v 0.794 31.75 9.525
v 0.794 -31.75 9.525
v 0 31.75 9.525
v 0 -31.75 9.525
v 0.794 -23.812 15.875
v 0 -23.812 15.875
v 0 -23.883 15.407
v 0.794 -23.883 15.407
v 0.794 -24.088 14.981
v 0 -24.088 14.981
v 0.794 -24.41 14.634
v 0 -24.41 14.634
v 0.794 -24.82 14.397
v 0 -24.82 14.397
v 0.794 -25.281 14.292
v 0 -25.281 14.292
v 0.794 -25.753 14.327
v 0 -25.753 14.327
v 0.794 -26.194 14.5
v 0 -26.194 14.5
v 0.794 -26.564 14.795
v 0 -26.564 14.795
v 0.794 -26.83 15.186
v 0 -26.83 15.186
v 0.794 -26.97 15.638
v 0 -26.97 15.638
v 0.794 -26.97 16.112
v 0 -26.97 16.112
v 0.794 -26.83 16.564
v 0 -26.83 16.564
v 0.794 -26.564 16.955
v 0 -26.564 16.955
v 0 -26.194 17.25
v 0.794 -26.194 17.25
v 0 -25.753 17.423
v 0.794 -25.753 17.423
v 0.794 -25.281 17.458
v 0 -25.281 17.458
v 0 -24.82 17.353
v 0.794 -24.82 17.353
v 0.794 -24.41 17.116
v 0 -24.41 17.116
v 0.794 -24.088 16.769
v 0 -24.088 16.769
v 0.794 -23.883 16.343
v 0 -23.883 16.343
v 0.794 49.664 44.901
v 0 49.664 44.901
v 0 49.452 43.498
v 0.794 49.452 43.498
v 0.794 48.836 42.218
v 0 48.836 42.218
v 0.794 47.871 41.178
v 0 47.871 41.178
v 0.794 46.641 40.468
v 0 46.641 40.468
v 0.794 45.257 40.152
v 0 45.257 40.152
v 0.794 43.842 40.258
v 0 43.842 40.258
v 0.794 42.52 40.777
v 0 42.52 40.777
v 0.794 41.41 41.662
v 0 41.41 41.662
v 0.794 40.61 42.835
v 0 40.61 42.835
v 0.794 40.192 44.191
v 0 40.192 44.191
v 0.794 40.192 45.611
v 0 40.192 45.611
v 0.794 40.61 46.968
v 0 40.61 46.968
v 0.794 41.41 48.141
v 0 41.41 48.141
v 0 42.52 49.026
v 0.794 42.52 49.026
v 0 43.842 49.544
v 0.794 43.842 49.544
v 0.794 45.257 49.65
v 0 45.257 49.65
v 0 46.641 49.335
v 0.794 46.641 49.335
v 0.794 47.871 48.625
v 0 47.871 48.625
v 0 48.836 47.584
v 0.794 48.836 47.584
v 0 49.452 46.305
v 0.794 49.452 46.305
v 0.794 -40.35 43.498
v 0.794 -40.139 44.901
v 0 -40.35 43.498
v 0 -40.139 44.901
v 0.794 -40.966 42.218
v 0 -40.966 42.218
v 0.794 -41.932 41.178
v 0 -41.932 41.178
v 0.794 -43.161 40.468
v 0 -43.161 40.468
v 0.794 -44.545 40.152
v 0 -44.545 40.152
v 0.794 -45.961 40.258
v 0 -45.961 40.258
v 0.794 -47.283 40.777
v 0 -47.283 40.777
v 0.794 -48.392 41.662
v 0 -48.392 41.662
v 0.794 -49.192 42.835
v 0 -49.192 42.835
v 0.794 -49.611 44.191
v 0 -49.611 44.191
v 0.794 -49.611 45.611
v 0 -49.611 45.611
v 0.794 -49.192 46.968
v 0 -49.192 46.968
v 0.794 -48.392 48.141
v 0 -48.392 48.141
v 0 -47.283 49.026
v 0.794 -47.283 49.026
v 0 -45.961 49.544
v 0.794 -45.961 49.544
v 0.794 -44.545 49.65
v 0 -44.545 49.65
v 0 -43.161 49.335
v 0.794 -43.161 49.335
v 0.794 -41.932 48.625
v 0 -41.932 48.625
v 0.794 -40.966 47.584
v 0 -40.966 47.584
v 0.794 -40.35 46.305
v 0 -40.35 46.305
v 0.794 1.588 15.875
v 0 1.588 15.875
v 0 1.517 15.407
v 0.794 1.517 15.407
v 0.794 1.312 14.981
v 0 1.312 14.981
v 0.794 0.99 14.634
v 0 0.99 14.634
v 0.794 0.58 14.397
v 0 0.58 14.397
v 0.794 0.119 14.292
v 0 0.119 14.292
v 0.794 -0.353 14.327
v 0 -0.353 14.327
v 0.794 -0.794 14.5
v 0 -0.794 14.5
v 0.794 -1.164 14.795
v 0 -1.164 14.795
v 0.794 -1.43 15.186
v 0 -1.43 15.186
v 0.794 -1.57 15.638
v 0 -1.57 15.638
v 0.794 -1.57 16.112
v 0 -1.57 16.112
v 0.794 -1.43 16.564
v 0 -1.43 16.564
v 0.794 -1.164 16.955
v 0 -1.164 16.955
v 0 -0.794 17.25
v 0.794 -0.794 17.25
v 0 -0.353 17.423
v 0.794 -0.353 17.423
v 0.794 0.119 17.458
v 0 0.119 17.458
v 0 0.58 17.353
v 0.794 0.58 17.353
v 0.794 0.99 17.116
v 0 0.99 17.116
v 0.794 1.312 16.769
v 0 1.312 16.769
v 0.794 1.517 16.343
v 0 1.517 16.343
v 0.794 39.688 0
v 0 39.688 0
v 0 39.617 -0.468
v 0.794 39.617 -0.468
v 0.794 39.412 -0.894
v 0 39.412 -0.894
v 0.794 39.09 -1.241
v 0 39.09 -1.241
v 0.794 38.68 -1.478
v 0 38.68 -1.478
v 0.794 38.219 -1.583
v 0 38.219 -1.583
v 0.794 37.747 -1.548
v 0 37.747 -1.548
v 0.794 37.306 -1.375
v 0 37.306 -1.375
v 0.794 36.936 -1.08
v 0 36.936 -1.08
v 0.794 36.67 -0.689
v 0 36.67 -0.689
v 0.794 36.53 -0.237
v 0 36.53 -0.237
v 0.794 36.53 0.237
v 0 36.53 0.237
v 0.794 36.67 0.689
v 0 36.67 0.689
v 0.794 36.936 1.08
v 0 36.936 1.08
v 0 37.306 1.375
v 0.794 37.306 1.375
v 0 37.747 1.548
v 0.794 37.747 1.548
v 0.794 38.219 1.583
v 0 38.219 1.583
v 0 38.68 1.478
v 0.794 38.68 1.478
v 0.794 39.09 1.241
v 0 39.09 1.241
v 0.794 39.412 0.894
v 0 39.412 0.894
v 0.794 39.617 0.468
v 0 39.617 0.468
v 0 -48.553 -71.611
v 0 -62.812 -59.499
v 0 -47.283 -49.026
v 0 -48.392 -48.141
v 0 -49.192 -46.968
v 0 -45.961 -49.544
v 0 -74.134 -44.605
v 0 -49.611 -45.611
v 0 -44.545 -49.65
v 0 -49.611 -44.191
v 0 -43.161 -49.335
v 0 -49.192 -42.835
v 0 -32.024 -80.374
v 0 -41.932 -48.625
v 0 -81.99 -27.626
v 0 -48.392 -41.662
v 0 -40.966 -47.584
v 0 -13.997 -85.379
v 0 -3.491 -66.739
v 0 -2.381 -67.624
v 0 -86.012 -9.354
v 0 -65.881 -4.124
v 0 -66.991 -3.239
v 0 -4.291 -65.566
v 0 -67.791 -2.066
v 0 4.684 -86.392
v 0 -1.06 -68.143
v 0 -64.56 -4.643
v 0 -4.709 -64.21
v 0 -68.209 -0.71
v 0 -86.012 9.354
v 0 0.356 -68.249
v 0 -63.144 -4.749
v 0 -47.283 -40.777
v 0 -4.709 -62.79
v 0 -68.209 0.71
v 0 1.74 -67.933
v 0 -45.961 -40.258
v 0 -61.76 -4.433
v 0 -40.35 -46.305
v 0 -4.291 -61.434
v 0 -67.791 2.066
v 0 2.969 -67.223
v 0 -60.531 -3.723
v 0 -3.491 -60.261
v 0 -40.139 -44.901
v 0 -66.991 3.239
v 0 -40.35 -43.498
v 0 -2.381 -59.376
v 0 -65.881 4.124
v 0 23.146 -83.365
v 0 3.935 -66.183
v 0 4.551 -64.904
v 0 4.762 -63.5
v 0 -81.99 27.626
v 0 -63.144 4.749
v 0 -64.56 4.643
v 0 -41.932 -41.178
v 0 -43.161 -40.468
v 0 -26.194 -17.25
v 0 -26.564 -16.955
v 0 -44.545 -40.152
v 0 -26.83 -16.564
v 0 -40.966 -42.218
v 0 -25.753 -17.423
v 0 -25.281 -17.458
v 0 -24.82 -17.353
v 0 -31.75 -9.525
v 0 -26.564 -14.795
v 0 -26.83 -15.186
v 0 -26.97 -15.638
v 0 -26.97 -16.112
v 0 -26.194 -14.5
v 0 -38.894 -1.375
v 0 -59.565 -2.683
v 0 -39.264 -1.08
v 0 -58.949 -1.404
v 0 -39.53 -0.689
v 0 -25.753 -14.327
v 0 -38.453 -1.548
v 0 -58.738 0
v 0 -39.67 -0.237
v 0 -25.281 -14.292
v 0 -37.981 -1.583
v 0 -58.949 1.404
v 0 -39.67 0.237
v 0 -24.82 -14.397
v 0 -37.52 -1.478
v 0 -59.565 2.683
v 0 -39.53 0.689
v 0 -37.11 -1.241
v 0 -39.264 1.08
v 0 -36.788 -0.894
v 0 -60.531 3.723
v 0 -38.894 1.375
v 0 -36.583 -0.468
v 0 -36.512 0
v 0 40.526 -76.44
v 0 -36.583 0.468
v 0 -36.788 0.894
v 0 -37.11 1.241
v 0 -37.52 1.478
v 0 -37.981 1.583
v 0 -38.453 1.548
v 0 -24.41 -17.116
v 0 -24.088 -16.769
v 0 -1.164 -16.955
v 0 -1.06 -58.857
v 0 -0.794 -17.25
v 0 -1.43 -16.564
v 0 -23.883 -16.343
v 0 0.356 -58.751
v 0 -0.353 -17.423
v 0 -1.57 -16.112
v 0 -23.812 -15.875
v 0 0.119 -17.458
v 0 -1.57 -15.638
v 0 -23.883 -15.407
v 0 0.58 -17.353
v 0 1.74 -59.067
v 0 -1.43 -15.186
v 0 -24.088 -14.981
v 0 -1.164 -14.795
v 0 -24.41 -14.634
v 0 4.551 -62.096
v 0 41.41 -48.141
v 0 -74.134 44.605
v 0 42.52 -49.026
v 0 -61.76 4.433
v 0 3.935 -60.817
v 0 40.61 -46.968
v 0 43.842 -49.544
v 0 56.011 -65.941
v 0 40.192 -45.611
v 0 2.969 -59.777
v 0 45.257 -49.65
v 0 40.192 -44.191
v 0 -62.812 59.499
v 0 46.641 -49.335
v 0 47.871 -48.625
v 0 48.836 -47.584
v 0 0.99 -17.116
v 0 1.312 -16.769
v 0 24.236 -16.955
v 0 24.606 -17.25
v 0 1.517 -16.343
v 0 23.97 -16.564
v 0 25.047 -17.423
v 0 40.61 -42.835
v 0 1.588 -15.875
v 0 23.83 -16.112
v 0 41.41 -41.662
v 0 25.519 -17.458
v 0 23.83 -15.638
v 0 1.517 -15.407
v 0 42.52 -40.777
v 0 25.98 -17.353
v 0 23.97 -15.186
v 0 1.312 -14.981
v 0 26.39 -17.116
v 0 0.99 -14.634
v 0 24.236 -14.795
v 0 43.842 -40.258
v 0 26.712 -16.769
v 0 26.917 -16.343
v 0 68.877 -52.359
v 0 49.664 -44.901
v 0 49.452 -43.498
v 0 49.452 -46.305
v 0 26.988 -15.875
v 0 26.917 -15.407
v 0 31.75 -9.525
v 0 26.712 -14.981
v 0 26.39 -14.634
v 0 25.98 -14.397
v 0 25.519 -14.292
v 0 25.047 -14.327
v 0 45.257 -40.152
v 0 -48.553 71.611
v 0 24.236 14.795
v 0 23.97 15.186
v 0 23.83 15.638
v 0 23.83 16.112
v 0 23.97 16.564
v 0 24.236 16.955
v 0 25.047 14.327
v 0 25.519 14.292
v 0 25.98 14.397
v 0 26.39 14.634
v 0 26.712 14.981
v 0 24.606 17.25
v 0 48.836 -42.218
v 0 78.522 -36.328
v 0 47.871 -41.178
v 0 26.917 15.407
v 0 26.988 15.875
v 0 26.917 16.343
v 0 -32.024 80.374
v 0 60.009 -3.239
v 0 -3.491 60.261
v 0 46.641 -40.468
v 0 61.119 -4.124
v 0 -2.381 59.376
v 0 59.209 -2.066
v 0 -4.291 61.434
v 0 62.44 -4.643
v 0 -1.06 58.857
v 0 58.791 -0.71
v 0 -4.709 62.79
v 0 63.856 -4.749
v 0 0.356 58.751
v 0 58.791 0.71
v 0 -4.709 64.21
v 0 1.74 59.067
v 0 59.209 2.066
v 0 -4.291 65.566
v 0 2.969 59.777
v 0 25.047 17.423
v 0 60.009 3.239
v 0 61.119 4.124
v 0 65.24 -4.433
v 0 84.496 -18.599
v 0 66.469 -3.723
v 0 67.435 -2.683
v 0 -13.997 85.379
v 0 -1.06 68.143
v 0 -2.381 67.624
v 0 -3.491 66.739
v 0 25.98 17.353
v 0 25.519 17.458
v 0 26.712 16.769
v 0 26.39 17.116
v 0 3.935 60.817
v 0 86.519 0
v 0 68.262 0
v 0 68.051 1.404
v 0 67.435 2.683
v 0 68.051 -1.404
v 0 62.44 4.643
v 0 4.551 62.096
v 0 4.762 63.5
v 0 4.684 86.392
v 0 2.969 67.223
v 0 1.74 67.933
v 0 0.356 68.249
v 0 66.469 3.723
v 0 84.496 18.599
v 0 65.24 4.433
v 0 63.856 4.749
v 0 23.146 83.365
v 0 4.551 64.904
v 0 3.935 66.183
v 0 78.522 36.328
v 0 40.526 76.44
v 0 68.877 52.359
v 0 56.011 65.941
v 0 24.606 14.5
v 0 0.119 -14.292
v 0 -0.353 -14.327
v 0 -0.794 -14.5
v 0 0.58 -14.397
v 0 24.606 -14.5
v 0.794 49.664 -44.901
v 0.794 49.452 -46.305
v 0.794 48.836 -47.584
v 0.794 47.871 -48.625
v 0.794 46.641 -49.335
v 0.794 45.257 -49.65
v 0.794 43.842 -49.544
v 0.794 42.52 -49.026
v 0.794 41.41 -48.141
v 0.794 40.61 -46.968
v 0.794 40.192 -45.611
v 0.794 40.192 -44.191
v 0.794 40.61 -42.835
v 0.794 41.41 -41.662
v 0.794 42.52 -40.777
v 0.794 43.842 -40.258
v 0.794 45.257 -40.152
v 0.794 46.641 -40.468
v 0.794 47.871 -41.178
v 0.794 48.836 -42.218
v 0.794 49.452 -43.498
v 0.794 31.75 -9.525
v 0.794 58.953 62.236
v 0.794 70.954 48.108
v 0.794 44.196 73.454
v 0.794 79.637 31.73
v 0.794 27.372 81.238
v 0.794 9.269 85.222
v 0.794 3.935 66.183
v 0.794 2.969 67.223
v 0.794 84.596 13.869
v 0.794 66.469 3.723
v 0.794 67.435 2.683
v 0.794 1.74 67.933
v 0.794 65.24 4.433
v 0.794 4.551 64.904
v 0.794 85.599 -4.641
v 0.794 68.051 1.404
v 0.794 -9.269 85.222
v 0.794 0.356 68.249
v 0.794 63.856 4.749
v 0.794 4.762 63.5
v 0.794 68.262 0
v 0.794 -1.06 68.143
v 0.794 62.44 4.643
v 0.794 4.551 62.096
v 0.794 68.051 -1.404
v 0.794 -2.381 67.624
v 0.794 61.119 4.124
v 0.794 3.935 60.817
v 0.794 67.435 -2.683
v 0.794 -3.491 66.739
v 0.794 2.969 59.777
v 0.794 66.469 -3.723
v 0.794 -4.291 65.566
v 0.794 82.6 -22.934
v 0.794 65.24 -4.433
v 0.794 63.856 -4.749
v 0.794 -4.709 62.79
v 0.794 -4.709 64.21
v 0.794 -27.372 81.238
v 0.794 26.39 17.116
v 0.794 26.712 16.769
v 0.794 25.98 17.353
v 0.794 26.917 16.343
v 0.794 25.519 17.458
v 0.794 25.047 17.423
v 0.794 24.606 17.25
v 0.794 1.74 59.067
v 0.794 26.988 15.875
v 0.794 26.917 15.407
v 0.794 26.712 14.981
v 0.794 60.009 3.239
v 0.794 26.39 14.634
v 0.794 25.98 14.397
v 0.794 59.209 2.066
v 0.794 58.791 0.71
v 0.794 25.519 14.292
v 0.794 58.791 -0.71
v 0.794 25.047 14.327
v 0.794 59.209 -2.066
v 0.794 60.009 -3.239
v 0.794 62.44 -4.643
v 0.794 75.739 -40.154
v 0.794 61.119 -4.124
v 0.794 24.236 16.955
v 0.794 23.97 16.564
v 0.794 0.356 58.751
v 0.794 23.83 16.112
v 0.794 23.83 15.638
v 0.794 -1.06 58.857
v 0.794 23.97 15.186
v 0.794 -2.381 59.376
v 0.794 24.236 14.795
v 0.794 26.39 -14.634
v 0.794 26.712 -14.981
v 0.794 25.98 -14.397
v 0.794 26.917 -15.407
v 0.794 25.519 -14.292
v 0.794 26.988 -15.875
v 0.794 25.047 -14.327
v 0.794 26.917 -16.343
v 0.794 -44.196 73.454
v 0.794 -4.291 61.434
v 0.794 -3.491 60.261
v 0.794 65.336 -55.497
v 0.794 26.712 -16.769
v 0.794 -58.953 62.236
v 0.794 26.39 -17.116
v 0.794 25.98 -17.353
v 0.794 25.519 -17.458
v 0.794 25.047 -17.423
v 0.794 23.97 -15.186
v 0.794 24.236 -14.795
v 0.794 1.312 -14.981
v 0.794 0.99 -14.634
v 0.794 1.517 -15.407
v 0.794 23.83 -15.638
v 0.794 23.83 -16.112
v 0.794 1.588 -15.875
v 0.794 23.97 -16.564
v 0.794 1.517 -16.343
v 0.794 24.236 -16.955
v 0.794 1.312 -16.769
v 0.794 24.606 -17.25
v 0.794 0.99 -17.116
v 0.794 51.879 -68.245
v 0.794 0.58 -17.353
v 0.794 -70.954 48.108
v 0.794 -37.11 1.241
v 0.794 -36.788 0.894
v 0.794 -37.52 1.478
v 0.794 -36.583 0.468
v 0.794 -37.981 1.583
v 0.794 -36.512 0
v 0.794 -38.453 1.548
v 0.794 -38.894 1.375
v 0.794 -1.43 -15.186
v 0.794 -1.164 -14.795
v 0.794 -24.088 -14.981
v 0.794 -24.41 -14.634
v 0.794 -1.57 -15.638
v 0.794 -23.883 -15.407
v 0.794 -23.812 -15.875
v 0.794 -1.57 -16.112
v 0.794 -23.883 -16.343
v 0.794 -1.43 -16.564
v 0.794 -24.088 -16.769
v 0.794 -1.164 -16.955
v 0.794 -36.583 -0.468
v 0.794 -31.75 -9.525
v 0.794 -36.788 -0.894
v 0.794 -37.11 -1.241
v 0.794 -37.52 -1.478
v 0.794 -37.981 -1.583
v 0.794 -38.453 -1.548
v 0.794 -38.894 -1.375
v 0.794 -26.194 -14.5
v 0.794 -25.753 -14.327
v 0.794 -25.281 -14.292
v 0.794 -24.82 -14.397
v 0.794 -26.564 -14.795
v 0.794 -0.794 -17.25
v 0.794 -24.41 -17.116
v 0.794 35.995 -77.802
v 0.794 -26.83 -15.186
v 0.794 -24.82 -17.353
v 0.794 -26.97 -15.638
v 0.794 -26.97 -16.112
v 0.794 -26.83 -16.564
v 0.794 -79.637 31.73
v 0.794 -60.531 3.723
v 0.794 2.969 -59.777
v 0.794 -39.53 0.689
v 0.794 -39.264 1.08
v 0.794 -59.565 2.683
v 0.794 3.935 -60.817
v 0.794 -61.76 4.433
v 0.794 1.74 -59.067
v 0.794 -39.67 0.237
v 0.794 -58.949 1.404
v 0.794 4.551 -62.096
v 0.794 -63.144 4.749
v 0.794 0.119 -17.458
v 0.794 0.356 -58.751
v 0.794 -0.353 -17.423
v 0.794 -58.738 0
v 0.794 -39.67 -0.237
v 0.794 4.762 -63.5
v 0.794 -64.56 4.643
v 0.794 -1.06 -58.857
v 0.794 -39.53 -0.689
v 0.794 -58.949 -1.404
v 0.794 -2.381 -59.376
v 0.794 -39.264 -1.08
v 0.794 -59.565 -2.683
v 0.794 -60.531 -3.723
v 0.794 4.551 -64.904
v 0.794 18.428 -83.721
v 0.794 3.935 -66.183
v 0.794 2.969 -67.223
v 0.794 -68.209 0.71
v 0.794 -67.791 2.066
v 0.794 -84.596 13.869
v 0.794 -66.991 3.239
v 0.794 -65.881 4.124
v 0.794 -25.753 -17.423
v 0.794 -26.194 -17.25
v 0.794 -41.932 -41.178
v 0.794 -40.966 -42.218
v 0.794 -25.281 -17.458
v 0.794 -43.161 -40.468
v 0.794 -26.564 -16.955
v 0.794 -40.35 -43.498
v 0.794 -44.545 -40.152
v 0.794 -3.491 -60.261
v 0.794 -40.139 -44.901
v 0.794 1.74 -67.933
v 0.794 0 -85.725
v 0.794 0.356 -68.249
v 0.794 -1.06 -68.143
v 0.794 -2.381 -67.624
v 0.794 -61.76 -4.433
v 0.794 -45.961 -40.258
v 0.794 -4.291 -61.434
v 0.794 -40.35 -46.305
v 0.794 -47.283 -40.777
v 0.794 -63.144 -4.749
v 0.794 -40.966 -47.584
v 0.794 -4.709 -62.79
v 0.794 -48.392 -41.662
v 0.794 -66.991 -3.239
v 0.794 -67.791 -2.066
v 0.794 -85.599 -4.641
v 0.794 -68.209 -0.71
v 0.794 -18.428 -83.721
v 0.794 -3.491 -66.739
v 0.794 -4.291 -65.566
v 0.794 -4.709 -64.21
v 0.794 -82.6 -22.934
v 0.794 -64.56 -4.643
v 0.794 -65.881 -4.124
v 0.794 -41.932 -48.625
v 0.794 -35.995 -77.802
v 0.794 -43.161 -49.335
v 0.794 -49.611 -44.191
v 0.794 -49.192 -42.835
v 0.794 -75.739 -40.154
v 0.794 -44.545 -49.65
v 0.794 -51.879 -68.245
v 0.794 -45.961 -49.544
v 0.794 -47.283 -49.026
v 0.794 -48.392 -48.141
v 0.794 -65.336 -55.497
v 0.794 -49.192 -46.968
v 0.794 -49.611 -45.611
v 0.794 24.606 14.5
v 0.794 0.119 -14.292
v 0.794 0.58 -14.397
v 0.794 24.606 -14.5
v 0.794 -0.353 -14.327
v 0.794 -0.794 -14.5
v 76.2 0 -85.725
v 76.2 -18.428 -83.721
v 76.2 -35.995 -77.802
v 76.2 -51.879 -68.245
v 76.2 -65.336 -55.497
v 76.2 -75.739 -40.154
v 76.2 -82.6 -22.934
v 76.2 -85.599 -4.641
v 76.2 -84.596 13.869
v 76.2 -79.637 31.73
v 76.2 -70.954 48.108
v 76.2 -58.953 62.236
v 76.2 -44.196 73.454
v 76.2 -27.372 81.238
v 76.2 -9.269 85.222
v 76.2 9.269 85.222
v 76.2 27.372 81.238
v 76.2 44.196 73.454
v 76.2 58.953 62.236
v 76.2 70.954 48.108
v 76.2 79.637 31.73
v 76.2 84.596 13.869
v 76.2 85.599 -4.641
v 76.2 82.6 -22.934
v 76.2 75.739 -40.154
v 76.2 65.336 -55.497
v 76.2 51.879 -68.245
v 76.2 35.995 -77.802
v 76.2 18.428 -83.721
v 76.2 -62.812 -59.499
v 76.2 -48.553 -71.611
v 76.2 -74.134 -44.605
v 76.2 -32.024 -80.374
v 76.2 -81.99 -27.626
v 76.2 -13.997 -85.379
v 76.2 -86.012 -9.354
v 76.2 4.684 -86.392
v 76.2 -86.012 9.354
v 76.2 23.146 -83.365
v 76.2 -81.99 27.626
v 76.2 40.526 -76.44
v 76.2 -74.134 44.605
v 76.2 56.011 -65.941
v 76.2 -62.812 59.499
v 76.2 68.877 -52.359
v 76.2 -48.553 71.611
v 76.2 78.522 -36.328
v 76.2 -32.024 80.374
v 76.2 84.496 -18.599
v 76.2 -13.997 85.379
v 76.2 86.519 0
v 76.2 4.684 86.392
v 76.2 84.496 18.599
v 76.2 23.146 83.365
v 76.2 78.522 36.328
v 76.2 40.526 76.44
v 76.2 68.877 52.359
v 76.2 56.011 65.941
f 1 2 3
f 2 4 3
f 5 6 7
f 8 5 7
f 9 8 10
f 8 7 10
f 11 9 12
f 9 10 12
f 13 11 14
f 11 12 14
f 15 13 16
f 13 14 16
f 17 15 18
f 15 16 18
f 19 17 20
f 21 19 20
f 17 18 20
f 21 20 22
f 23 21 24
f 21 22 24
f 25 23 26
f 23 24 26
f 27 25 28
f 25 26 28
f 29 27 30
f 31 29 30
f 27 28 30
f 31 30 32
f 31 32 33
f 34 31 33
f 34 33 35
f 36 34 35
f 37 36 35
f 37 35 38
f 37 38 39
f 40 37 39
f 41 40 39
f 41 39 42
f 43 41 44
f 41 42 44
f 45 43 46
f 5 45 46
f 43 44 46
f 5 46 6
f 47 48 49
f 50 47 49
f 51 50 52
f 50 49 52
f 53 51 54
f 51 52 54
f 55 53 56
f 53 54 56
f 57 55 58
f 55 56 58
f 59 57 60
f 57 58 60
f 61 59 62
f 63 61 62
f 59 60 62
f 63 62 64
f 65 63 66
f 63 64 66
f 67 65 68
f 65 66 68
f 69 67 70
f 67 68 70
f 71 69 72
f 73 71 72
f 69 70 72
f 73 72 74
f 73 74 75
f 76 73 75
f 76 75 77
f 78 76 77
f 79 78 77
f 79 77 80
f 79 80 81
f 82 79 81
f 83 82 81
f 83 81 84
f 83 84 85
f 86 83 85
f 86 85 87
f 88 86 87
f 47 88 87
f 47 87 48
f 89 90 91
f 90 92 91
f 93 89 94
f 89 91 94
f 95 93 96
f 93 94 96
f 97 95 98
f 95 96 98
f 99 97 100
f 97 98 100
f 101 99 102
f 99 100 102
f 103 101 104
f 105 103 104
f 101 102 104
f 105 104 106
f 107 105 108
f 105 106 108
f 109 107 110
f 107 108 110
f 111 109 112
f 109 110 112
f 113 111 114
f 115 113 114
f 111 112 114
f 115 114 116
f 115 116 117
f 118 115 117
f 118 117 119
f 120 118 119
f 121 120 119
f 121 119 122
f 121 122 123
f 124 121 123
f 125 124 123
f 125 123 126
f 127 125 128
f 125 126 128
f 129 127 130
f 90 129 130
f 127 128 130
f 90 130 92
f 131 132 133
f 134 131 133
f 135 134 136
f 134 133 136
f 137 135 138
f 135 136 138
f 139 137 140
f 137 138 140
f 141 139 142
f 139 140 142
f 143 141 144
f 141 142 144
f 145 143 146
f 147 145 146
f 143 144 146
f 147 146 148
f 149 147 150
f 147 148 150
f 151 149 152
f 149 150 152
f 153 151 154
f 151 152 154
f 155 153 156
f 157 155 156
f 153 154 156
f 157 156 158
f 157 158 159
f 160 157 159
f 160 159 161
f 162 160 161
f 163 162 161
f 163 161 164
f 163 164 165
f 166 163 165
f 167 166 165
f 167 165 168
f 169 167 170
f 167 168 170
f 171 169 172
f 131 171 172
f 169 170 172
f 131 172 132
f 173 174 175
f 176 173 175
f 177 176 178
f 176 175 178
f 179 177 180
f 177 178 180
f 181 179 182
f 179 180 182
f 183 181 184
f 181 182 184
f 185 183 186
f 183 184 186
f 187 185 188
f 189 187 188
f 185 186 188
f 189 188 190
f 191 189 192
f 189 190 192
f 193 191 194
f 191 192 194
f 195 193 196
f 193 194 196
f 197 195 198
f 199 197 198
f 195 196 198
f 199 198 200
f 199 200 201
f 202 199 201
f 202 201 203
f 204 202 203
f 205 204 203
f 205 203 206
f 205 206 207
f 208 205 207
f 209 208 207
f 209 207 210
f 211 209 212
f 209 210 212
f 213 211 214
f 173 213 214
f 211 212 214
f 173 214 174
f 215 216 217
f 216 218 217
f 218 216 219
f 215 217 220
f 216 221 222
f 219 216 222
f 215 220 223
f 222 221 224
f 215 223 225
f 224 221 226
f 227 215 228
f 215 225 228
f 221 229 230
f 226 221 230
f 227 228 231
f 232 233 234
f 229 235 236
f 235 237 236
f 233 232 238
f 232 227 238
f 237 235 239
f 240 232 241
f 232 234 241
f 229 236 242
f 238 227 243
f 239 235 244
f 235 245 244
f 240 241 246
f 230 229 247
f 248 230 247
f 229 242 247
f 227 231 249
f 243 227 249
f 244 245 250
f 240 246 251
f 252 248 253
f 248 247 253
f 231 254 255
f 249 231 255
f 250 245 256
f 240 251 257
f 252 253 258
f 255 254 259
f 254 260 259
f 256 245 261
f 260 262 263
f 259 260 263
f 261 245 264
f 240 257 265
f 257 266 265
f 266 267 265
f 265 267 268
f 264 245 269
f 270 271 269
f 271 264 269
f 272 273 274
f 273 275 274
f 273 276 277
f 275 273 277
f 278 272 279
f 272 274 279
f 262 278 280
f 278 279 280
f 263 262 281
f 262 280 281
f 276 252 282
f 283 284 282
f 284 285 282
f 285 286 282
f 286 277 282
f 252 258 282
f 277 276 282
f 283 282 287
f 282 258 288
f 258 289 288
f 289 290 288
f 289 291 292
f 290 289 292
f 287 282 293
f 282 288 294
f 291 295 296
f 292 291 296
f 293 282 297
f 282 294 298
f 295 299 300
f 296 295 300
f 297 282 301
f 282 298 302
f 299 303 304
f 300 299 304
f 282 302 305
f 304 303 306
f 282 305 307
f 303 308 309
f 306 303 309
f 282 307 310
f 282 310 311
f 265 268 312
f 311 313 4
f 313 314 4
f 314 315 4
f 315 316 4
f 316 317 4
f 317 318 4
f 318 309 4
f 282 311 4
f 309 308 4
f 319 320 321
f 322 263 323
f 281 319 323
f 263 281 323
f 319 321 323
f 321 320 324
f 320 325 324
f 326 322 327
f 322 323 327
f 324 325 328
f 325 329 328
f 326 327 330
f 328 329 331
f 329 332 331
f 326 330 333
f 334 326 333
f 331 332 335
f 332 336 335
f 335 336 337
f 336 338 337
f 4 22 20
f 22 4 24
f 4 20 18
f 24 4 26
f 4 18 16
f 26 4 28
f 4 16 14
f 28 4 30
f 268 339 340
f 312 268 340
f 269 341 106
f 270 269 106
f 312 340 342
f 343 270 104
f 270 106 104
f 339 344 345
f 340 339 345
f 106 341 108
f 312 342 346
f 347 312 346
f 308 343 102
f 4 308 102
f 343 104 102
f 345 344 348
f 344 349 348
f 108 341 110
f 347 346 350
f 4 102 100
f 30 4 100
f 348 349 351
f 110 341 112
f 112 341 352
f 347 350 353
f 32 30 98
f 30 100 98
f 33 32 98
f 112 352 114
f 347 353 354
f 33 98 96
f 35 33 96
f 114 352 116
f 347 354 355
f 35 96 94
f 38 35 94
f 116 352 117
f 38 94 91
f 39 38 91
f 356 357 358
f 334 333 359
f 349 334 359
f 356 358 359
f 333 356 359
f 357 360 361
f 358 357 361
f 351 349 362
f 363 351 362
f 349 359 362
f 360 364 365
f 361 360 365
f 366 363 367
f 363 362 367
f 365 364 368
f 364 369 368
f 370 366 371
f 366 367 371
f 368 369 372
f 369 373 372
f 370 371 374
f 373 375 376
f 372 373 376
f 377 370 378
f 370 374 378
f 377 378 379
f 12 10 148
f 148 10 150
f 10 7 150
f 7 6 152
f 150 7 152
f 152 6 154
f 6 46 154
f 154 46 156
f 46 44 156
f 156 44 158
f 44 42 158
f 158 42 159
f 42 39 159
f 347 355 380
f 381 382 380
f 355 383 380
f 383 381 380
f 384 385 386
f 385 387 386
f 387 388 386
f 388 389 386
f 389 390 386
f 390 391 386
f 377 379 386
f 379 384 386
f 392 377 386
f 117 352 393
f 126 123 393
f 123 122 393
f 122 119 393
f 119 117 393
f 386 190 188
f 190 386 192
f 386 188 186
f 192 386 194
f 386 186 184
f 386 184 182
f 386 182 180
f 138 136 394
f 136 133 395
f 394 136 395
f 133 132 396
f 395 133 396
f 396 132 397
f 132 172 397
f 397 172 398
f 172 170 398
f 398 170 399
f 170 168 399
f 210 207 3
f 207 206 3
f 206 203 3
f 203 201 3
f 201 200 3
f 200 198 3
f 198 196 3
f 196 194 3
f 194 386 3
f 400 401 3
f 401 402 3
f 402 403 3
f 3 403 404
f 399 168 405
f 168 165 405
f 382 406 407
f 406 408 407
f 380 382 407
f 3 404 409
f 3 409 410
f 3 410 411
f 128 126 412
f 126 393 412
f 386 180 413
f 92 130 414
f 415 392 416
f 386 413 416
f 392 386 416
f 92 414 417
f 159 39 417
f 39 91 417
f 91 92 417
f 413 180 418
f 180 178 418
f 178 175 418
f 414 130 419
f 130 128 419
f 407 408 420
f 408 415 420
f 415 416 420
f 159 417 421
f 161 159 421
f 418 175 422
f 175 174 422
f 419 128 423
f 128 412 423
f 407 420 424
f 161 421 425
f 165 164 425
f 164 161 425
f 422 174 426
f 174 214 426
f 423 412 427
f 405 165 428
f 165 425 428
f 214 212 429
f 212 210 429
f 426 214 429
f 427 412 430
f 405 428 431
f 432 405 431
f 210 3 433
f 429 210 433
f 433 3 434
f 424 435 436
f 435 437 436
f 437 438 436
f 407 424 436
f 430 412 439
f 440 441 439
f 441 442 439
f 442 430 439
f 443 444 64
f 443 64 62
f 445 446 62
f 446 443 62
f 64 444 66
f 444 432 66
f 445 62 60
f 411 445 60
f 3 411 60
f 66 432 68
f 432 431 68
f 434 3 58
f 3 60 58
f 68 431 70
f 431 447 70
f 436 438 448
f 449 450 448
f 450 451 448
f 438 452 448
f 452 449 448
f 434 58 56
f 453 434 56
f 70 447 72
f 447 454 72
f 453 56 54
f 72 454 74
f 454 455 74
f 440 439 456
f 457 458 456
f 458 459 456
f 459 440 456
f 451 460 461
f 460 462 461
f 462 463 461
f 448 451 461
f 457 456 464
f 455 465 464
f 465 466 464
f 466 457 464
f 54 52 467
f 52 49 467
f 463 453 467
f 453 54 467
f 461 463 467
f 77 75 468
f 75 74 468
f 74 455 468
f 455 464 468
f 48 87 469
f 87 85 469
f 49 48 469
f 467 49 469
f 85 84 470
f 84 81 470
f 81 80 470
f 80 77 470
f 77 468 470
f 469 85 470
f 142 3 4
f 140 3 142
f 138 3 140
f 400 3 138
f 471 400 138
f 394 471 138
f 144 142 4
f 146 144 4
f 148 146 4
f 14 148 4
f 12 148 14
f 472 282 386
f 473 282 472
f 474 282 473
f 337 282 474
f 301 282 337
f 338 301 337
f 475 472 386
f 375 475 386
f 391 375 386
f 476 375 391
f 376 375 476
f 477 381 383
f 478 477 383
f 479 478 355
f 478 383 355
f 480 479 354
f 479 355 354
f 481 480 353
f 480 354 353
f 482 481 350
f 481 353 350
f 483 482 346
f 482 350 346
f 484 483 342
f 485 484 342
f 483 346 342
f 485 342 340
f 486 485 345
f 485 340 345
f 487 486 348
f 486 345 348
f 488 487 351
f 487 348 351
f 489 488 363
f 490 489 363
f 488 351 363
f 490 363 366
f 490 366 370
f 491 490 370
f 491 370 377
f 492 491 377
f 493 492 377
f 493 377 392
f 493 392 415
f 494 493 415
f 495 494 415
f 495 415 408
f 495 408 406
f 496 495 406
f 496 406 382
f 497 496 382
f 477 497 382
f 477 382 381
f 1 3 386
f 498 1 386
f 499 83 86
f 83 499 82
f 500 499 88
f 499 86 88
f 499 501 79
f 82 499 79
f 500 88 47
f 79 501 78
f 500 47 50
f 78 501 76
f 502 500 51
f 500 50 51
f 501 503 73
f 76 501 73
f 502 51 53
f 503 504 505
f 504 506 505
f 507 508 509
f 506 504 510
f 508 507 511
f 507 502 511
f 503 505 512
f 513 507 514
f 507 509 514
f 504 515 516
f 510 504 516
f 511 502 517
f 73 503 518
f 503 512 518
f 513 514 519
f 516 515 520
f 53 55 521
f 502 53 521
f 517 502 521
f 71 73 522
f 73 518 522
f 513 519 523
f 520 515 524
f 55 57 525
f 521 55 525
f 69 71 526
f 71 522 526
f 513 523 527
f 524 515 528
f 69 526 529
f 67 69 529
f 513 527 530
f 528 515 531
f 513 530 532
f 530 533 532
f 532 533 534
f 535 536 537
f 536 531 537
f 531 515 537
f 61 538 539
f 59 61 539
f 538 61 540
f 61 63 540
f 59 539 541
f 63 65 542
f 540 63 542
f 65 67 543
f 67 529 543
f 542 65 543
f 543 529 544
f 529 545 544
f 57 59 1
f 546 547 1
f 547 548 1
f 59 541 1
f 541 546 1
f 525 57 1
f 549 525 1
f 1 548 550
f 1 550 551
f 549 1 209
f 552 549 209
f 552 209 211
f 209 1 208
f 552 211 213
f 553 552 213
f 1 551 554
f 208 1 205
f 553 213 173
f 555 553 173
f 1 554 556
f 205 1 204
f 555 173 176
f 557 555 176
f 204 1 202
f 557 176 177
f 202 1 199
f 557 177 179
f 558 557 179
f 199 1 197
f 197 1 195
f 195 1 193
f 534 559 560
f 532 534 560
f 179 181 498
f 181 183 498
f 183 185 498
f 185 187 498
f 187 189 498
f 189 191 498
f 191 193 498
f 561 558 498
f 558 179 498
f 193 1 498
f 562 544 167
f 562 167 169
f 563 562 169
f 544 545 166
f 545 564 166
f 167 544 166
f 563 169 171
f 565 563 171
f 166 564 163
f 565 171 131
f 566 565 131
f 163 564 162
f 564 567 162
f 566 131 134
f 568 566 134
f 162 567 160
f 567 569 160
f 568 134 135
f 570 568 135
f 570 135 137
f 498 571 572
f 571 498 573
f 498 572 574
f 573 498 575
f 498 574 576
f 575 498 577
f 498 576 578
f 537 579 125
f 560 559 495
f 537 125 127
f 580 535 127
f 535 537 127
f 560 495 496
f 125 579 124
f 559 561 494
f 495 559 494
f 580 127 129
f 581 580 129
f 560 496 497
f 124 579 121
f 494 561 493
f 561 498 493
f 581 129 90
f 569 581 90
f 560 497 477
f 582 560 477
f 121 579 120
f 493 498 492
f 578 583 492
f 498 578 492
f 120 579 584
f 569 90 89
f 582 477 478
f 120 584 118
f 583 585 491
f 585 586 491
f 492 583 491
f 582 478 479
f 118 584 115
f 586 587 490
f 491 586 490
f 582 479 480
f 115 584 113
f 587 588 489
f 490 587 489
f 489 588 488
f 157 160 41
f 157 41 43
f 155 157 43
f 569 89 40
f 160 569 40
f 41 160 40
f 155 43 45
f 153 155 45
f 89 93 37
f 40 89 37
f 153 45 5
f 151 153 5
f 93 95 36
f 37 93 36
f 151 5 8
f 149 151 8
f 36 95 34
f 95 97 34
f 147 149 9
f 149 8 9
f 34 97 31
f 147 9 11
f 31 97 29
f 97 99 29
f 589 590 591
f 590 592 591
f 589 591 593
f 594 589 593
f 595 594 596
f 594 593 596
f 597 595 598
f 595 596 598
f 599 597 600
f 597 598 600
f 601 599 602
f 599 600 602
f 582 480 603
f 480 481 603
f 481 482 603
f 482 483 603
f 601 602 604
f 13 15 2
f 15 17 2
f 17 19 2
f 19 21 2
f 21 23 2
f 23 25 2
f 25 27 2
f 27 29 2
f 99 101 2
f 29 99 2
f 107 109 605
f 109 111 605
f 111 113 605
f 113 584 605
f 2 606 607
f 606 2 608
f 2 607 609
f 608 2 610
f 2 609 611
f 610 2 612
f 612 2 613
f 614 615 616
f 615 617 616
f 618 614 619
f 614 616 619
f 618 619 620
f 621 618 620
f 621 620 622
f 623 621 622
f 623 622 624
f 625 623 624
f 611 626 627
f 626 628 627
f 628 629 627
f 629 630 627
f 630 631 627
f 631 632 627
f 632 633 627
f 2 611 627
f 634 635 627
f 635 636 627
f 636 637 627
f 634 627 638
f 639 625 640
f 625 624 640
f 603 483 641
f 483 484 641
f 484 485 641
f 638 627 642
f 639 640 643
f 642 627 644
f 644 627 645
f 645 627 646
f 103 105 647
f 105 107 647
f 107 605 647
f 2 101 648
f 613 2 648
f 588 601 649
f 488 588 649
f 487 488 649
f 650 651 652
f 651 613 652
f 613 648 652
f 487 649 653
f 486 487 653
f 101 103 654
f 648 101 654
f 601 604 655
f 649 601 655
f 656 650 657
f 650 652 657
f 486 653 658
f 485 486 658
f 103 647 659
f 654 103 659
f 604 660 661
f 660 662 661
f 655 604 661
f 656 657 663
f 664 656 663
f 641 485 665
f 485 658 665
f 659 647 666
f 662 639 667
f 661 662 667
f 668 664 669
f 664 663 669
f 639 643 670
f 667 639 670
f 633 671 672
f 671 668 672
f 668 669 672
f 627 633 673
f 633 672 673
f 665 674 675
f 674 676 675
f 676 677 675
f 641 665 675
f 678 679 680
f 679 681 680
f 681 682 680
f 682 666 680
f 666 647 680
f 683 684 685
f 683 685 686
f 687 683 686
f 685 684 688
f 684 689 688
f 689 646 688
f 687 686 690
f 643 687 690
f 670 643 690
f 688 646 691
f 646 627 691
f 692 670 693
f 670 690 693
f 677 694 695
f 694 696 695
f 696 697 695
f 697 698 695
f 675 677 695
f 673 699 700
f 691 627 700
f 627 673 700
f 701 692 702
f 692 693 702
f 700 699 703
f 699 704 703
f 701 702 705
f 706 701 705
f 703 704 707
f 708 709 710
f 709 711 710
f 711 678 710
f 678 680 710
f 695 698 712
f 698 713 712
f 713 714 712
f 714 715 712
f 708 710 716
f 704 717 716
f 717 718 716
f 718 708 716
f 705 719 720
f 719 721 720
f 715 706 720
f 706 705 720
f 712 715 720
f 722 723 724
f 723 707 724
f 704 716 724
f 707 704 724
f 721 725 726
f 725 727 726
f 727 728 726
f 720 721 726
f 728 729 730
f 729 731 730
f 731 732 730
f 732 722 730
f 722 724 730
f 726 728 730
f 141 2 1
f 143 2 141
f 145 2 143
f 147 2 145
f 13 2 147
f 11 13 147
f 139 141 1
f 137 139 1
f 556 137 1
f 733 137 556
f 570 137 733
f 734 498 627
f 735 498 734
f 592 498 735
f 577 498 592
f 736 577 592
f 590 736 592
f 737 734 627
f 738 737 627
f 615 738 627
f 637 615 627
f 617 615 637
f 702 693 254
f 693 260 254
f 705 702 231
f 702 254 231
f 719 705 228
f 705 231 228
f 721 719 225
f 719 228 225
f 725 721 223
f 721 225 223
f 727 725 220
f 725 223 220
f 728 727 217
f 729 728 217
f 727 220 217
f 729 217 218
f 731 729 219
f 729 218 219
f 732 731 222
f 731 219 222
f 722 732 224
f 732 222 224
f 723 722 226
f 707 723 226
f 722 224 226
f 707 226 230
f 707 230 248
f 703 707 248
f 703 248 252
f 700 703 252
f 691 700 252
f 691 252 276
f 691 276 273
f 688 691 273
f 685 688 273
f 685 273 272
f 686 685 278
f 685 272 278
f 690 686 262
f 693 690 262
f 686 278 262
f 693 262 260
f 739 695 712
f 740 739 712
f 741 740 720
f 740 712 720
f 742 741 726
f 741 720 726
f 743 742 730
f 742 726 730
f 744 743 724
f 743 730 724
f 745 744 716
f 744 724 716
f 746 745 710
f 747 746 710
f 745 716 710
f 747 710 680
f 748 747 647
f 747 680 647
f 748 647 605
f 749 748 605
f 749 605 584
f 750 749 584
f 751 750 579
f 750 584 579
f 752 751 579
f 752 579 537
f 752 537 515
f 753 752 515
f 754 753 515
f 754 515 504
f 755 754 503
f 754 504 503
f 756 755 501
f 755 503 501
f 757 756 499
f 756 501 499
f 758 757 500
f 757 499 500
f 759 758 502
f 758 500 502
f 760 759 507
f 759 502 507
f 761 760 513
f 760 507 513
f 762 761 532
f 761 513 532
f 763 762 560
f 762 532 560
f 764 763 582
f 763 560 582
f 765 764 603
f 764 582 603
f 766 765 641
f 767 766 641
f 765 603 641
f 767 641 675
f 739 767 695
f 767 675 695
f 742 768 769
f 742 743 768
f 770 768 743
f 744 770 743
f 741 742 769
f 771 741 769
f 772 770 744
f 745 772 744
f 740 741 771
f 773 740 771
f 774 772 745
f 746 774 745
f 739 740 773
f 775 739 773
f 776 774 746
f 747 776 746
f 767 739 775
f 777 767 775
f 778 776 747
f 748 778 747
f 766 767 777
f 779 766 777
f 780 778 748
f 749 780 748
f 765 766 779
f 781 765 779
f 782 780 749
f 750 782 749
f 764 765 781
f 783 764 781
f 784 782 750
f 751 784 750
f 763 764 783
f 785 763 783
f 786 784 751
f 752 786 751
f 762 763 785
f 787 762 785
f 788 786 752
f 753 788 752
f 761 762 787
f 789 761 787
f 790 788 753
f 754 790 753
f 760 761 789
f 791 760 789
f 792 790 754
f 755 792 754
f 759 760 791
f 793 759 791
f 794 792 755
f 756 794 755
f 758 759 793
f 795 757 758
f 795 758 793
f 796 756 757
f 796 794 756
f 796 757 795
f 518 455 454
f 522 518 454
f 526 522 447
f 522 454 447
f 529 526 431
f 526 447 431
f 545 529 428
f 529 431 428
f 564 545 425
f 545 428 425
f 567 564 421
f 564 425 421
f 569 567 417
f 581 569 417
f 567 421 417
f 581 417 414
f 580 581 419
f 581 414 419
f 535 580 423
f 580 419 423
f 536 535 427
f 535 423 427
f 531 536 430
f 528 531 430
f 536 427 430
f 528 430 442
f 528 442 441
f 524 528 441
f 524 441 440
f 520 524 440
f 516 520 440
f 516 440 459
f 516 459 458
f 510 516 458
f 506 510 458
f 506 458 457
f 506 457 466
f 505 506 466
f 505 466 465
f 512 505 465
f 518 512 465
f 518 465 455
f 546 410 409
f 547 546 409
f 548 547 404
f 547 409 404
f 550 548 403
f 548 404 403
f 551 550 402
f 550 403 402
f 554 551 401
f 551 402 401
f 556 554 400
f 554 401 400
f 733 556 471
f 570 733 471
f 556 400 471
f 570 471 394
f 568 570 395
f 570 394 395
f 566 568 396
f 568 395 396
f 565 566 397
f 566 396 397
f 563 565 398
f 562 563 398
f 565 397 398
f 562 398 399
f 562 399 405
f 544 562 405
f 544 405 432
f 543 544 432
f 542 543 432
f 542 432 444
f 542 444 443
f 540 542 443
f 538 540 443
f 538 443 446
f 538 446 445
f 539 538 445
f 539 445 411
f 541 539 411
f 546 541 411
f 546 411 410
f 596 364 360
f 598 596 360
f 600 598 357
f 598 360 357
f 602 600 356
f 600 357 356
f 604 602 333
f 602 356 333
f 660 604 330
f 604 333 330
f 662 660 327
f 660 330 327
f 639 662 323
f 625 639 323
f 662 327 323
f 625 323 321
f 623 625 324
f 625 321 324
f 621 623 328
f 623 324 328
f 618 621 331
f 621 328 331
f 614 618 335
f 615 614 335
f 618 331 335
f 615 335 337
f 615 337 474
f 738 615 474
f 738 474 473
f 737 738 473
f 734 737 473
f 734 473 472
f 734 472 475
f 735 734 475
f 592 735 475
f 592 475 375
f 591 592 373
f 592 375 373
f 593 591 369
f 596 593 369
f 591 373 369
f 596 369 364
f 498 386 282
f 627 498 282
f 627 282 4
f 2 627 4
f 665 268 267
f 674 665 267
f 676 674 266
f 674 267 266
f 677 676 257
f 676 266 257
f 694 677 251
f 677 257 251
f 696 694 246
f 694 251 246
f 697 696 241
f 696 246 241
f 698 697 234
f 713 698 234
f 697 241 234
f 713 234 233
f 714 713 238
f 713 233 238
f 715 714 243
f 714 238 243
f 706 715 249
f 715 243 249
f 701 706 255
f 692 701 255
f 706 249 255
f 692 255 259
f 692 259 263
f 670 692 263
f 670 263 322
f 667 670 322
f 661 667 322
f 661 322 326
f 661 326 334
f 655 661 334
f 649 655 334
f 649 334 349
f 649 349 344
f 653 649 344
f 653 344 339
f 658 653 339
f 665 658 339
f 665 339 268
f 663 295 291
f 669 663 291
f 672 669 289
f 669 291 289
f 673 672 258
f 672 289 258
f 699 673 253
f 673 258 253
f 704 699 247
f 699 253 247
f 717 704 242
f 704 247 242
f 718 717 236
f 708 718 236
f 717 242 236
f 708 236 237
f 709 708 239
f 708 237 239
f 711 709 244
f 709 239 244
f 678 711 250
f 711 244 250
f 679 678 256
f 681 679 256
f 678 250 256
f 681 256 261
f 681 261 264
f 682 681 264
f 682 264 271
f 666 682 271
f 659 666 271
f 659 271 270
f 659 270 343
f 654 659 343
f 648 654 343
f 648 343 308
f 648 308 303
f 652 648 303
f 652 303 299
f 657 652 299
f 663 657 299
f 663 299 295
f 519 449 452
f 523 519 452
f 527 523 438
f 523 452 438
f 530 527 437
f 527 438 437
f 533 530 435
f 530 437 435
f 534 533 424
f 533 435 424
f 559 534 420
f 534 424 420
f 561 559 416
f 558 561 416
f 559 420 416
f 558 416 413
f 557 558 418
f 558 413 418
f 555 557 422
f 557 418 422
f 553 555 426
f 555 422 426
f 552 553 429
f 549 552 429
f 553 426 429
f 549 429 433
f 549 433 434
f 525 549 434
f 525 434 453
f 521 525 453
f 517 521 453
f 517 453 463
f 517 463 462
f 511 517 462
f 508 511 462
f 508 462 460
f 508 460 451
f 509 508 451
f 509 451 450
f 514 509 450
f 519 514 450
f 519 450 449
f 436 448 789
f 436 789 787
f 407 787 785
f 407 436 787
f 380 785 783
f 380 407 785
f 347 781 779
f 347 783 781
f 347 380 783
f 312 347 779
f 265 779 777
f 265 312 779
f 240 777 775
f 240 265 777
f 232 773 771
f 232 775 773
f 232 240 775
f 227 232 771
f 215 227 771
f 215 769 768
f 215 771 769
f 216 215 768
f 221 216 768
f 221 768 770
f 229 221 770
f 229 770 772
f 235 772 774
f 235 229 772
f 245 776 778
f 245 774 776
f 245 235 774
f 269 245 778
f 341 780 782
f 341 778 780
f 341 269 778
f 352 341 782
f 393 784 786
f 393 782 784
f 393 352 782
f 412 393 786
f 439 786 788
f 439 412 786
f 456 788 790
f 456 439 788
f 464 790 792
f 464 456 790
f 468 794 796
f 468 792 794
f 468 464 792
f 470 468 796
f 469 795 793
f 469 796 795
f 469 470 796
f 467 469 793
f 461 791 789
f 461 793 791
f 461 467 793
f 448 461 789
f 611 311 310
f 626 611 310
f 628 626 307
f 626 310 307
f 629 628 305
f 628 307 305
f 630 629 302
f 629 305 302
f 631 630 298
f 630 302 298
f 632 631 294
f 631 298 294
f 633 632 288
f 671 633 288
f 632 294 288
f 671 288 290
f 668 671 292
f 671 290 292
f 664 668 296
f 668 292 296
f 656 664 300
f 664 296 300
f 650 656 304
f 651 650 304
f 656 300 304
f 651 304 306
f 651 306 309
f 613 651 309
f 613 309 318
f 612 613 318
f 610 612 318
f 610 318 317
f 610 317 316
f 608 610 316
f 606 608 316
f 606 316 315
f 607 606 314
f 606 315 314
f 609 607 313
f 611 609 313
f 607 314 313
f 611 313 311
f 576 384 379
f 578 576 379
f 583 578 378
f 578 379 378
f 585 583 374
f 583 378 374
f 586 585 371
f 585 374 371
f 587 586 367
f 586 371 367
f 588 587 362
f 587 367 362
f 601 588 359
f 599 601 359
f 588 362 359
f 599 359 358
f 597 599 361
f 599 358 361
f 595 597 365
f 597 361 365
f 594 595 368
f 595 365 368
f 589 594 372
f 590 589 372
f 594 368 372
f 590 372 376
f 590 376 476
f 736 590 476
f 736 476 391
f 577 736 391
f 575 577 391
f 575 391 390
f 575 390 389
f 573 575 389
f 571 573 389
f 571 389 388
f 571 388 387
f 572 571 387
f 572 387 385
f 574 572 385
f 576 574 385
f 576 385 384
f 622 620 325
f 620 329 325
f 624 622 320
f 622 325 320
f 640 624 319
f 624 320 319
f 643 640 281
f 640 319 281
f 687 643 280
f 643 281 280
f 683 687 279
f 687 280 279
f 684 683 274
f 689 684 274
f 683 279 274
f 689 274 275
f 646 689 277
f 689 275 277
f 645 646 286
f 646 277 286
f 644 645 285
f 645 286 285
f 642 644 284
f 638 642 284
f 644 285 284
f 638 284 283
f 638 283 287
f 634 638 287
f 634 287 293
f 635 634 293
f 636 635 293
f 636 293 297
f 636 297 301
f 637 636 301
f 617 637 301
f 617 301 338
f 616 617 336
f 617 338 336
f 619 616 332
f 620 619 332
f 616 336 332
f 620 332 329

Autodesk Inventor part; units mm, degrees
ref_plane "YZ Plane" through (0, 0, 0) normal (1, 0, 0) x (0, 1, 0)
ref_plane "XZ Plane" through (0, 0, 0) normal (0, 1, 0) x (-1, 0, 0)
ref_plane "XY Plane" through (0, 0, 0) normal (0, 0, 1) x (1, 0, 0)
sketch "Sketch1" plane through (0, 0, 0) normal (1, 0, 0) x (0, 1, 0)
  circle A0 centre (0, 0) radius 86.5188
  circle A1 centre (0, 63.5) radius 4.7625
  circle A2 centre (-44.9013, 44.9013) radius 4.7625
  circle A3 centre (-63.5, 0) radius 4.7625
  circle A4 centre (-44.9013, -44.9013) radius 4.7625
  circle A5 centre (0, -63.5) radius 4.7625
  circle A6 centre (44.9013, -44.9013) radius 4.7625
  circle A7 centre (63.5, 0) radius 4.7625
  circle A8 centre (44.9013, 44.9013) radius 4.7625
  line L0 (-31.75, 9.525) -> (31.75, 9.525)
  line L1 (31.75, 9.525) -> (31.75, -9.525)
  line L2 (31.75, -9.525) -> (-31.75, -9.525)
  line L3 (-31.75, -9.525) -> (-31.75, 9.525)
  circle A9 centre (0, 15.875) radius 1.5875
  circle A10 centre (-25.4, 15.875) radius 1.5875
  circle A11 centre (25.4, 15.875) radius 1.5875
  circle A12 centre (0, -15.875) radius 1.5875
  circle A13 centre (-25.4, -15.875) radius 1.5875
  circle A14 centre (25.4, -15.875) radius 1.5875
  circle A15 centre (-38.1, 0) radius 1.5875
  circle A16 centre (38.1, 0) radius 1.5875
  point P0 (0, 9.525)
  point P1 (-31.75, 0)
  dimension "d0" = 173.0375
  dimension "d3" = 360
  dimension "d5" = 9.525
  dimension "d6" = 63.5
  dimension "d7" = 63.5
  dimension "d8" = 19.05
  dimension "d9" = 3.175
  dimension "d10" = 15.875
  dimension "d13" = 25.4
  dimension "d20" = 25.4
  dimension "d27" = 31.75
  dimension "d32" = 38.1
  dimension "d33" = 3.175
  dimension "d36" = 76.2
extrude "Extrusion1" add sketch "Sketch1" along normal blind 76.2
hole "Hole1" at (76.2, 0, 0) direction (-1, 0, 0) diameter 171.45 depth 75.4062
properties part number "top cap"
